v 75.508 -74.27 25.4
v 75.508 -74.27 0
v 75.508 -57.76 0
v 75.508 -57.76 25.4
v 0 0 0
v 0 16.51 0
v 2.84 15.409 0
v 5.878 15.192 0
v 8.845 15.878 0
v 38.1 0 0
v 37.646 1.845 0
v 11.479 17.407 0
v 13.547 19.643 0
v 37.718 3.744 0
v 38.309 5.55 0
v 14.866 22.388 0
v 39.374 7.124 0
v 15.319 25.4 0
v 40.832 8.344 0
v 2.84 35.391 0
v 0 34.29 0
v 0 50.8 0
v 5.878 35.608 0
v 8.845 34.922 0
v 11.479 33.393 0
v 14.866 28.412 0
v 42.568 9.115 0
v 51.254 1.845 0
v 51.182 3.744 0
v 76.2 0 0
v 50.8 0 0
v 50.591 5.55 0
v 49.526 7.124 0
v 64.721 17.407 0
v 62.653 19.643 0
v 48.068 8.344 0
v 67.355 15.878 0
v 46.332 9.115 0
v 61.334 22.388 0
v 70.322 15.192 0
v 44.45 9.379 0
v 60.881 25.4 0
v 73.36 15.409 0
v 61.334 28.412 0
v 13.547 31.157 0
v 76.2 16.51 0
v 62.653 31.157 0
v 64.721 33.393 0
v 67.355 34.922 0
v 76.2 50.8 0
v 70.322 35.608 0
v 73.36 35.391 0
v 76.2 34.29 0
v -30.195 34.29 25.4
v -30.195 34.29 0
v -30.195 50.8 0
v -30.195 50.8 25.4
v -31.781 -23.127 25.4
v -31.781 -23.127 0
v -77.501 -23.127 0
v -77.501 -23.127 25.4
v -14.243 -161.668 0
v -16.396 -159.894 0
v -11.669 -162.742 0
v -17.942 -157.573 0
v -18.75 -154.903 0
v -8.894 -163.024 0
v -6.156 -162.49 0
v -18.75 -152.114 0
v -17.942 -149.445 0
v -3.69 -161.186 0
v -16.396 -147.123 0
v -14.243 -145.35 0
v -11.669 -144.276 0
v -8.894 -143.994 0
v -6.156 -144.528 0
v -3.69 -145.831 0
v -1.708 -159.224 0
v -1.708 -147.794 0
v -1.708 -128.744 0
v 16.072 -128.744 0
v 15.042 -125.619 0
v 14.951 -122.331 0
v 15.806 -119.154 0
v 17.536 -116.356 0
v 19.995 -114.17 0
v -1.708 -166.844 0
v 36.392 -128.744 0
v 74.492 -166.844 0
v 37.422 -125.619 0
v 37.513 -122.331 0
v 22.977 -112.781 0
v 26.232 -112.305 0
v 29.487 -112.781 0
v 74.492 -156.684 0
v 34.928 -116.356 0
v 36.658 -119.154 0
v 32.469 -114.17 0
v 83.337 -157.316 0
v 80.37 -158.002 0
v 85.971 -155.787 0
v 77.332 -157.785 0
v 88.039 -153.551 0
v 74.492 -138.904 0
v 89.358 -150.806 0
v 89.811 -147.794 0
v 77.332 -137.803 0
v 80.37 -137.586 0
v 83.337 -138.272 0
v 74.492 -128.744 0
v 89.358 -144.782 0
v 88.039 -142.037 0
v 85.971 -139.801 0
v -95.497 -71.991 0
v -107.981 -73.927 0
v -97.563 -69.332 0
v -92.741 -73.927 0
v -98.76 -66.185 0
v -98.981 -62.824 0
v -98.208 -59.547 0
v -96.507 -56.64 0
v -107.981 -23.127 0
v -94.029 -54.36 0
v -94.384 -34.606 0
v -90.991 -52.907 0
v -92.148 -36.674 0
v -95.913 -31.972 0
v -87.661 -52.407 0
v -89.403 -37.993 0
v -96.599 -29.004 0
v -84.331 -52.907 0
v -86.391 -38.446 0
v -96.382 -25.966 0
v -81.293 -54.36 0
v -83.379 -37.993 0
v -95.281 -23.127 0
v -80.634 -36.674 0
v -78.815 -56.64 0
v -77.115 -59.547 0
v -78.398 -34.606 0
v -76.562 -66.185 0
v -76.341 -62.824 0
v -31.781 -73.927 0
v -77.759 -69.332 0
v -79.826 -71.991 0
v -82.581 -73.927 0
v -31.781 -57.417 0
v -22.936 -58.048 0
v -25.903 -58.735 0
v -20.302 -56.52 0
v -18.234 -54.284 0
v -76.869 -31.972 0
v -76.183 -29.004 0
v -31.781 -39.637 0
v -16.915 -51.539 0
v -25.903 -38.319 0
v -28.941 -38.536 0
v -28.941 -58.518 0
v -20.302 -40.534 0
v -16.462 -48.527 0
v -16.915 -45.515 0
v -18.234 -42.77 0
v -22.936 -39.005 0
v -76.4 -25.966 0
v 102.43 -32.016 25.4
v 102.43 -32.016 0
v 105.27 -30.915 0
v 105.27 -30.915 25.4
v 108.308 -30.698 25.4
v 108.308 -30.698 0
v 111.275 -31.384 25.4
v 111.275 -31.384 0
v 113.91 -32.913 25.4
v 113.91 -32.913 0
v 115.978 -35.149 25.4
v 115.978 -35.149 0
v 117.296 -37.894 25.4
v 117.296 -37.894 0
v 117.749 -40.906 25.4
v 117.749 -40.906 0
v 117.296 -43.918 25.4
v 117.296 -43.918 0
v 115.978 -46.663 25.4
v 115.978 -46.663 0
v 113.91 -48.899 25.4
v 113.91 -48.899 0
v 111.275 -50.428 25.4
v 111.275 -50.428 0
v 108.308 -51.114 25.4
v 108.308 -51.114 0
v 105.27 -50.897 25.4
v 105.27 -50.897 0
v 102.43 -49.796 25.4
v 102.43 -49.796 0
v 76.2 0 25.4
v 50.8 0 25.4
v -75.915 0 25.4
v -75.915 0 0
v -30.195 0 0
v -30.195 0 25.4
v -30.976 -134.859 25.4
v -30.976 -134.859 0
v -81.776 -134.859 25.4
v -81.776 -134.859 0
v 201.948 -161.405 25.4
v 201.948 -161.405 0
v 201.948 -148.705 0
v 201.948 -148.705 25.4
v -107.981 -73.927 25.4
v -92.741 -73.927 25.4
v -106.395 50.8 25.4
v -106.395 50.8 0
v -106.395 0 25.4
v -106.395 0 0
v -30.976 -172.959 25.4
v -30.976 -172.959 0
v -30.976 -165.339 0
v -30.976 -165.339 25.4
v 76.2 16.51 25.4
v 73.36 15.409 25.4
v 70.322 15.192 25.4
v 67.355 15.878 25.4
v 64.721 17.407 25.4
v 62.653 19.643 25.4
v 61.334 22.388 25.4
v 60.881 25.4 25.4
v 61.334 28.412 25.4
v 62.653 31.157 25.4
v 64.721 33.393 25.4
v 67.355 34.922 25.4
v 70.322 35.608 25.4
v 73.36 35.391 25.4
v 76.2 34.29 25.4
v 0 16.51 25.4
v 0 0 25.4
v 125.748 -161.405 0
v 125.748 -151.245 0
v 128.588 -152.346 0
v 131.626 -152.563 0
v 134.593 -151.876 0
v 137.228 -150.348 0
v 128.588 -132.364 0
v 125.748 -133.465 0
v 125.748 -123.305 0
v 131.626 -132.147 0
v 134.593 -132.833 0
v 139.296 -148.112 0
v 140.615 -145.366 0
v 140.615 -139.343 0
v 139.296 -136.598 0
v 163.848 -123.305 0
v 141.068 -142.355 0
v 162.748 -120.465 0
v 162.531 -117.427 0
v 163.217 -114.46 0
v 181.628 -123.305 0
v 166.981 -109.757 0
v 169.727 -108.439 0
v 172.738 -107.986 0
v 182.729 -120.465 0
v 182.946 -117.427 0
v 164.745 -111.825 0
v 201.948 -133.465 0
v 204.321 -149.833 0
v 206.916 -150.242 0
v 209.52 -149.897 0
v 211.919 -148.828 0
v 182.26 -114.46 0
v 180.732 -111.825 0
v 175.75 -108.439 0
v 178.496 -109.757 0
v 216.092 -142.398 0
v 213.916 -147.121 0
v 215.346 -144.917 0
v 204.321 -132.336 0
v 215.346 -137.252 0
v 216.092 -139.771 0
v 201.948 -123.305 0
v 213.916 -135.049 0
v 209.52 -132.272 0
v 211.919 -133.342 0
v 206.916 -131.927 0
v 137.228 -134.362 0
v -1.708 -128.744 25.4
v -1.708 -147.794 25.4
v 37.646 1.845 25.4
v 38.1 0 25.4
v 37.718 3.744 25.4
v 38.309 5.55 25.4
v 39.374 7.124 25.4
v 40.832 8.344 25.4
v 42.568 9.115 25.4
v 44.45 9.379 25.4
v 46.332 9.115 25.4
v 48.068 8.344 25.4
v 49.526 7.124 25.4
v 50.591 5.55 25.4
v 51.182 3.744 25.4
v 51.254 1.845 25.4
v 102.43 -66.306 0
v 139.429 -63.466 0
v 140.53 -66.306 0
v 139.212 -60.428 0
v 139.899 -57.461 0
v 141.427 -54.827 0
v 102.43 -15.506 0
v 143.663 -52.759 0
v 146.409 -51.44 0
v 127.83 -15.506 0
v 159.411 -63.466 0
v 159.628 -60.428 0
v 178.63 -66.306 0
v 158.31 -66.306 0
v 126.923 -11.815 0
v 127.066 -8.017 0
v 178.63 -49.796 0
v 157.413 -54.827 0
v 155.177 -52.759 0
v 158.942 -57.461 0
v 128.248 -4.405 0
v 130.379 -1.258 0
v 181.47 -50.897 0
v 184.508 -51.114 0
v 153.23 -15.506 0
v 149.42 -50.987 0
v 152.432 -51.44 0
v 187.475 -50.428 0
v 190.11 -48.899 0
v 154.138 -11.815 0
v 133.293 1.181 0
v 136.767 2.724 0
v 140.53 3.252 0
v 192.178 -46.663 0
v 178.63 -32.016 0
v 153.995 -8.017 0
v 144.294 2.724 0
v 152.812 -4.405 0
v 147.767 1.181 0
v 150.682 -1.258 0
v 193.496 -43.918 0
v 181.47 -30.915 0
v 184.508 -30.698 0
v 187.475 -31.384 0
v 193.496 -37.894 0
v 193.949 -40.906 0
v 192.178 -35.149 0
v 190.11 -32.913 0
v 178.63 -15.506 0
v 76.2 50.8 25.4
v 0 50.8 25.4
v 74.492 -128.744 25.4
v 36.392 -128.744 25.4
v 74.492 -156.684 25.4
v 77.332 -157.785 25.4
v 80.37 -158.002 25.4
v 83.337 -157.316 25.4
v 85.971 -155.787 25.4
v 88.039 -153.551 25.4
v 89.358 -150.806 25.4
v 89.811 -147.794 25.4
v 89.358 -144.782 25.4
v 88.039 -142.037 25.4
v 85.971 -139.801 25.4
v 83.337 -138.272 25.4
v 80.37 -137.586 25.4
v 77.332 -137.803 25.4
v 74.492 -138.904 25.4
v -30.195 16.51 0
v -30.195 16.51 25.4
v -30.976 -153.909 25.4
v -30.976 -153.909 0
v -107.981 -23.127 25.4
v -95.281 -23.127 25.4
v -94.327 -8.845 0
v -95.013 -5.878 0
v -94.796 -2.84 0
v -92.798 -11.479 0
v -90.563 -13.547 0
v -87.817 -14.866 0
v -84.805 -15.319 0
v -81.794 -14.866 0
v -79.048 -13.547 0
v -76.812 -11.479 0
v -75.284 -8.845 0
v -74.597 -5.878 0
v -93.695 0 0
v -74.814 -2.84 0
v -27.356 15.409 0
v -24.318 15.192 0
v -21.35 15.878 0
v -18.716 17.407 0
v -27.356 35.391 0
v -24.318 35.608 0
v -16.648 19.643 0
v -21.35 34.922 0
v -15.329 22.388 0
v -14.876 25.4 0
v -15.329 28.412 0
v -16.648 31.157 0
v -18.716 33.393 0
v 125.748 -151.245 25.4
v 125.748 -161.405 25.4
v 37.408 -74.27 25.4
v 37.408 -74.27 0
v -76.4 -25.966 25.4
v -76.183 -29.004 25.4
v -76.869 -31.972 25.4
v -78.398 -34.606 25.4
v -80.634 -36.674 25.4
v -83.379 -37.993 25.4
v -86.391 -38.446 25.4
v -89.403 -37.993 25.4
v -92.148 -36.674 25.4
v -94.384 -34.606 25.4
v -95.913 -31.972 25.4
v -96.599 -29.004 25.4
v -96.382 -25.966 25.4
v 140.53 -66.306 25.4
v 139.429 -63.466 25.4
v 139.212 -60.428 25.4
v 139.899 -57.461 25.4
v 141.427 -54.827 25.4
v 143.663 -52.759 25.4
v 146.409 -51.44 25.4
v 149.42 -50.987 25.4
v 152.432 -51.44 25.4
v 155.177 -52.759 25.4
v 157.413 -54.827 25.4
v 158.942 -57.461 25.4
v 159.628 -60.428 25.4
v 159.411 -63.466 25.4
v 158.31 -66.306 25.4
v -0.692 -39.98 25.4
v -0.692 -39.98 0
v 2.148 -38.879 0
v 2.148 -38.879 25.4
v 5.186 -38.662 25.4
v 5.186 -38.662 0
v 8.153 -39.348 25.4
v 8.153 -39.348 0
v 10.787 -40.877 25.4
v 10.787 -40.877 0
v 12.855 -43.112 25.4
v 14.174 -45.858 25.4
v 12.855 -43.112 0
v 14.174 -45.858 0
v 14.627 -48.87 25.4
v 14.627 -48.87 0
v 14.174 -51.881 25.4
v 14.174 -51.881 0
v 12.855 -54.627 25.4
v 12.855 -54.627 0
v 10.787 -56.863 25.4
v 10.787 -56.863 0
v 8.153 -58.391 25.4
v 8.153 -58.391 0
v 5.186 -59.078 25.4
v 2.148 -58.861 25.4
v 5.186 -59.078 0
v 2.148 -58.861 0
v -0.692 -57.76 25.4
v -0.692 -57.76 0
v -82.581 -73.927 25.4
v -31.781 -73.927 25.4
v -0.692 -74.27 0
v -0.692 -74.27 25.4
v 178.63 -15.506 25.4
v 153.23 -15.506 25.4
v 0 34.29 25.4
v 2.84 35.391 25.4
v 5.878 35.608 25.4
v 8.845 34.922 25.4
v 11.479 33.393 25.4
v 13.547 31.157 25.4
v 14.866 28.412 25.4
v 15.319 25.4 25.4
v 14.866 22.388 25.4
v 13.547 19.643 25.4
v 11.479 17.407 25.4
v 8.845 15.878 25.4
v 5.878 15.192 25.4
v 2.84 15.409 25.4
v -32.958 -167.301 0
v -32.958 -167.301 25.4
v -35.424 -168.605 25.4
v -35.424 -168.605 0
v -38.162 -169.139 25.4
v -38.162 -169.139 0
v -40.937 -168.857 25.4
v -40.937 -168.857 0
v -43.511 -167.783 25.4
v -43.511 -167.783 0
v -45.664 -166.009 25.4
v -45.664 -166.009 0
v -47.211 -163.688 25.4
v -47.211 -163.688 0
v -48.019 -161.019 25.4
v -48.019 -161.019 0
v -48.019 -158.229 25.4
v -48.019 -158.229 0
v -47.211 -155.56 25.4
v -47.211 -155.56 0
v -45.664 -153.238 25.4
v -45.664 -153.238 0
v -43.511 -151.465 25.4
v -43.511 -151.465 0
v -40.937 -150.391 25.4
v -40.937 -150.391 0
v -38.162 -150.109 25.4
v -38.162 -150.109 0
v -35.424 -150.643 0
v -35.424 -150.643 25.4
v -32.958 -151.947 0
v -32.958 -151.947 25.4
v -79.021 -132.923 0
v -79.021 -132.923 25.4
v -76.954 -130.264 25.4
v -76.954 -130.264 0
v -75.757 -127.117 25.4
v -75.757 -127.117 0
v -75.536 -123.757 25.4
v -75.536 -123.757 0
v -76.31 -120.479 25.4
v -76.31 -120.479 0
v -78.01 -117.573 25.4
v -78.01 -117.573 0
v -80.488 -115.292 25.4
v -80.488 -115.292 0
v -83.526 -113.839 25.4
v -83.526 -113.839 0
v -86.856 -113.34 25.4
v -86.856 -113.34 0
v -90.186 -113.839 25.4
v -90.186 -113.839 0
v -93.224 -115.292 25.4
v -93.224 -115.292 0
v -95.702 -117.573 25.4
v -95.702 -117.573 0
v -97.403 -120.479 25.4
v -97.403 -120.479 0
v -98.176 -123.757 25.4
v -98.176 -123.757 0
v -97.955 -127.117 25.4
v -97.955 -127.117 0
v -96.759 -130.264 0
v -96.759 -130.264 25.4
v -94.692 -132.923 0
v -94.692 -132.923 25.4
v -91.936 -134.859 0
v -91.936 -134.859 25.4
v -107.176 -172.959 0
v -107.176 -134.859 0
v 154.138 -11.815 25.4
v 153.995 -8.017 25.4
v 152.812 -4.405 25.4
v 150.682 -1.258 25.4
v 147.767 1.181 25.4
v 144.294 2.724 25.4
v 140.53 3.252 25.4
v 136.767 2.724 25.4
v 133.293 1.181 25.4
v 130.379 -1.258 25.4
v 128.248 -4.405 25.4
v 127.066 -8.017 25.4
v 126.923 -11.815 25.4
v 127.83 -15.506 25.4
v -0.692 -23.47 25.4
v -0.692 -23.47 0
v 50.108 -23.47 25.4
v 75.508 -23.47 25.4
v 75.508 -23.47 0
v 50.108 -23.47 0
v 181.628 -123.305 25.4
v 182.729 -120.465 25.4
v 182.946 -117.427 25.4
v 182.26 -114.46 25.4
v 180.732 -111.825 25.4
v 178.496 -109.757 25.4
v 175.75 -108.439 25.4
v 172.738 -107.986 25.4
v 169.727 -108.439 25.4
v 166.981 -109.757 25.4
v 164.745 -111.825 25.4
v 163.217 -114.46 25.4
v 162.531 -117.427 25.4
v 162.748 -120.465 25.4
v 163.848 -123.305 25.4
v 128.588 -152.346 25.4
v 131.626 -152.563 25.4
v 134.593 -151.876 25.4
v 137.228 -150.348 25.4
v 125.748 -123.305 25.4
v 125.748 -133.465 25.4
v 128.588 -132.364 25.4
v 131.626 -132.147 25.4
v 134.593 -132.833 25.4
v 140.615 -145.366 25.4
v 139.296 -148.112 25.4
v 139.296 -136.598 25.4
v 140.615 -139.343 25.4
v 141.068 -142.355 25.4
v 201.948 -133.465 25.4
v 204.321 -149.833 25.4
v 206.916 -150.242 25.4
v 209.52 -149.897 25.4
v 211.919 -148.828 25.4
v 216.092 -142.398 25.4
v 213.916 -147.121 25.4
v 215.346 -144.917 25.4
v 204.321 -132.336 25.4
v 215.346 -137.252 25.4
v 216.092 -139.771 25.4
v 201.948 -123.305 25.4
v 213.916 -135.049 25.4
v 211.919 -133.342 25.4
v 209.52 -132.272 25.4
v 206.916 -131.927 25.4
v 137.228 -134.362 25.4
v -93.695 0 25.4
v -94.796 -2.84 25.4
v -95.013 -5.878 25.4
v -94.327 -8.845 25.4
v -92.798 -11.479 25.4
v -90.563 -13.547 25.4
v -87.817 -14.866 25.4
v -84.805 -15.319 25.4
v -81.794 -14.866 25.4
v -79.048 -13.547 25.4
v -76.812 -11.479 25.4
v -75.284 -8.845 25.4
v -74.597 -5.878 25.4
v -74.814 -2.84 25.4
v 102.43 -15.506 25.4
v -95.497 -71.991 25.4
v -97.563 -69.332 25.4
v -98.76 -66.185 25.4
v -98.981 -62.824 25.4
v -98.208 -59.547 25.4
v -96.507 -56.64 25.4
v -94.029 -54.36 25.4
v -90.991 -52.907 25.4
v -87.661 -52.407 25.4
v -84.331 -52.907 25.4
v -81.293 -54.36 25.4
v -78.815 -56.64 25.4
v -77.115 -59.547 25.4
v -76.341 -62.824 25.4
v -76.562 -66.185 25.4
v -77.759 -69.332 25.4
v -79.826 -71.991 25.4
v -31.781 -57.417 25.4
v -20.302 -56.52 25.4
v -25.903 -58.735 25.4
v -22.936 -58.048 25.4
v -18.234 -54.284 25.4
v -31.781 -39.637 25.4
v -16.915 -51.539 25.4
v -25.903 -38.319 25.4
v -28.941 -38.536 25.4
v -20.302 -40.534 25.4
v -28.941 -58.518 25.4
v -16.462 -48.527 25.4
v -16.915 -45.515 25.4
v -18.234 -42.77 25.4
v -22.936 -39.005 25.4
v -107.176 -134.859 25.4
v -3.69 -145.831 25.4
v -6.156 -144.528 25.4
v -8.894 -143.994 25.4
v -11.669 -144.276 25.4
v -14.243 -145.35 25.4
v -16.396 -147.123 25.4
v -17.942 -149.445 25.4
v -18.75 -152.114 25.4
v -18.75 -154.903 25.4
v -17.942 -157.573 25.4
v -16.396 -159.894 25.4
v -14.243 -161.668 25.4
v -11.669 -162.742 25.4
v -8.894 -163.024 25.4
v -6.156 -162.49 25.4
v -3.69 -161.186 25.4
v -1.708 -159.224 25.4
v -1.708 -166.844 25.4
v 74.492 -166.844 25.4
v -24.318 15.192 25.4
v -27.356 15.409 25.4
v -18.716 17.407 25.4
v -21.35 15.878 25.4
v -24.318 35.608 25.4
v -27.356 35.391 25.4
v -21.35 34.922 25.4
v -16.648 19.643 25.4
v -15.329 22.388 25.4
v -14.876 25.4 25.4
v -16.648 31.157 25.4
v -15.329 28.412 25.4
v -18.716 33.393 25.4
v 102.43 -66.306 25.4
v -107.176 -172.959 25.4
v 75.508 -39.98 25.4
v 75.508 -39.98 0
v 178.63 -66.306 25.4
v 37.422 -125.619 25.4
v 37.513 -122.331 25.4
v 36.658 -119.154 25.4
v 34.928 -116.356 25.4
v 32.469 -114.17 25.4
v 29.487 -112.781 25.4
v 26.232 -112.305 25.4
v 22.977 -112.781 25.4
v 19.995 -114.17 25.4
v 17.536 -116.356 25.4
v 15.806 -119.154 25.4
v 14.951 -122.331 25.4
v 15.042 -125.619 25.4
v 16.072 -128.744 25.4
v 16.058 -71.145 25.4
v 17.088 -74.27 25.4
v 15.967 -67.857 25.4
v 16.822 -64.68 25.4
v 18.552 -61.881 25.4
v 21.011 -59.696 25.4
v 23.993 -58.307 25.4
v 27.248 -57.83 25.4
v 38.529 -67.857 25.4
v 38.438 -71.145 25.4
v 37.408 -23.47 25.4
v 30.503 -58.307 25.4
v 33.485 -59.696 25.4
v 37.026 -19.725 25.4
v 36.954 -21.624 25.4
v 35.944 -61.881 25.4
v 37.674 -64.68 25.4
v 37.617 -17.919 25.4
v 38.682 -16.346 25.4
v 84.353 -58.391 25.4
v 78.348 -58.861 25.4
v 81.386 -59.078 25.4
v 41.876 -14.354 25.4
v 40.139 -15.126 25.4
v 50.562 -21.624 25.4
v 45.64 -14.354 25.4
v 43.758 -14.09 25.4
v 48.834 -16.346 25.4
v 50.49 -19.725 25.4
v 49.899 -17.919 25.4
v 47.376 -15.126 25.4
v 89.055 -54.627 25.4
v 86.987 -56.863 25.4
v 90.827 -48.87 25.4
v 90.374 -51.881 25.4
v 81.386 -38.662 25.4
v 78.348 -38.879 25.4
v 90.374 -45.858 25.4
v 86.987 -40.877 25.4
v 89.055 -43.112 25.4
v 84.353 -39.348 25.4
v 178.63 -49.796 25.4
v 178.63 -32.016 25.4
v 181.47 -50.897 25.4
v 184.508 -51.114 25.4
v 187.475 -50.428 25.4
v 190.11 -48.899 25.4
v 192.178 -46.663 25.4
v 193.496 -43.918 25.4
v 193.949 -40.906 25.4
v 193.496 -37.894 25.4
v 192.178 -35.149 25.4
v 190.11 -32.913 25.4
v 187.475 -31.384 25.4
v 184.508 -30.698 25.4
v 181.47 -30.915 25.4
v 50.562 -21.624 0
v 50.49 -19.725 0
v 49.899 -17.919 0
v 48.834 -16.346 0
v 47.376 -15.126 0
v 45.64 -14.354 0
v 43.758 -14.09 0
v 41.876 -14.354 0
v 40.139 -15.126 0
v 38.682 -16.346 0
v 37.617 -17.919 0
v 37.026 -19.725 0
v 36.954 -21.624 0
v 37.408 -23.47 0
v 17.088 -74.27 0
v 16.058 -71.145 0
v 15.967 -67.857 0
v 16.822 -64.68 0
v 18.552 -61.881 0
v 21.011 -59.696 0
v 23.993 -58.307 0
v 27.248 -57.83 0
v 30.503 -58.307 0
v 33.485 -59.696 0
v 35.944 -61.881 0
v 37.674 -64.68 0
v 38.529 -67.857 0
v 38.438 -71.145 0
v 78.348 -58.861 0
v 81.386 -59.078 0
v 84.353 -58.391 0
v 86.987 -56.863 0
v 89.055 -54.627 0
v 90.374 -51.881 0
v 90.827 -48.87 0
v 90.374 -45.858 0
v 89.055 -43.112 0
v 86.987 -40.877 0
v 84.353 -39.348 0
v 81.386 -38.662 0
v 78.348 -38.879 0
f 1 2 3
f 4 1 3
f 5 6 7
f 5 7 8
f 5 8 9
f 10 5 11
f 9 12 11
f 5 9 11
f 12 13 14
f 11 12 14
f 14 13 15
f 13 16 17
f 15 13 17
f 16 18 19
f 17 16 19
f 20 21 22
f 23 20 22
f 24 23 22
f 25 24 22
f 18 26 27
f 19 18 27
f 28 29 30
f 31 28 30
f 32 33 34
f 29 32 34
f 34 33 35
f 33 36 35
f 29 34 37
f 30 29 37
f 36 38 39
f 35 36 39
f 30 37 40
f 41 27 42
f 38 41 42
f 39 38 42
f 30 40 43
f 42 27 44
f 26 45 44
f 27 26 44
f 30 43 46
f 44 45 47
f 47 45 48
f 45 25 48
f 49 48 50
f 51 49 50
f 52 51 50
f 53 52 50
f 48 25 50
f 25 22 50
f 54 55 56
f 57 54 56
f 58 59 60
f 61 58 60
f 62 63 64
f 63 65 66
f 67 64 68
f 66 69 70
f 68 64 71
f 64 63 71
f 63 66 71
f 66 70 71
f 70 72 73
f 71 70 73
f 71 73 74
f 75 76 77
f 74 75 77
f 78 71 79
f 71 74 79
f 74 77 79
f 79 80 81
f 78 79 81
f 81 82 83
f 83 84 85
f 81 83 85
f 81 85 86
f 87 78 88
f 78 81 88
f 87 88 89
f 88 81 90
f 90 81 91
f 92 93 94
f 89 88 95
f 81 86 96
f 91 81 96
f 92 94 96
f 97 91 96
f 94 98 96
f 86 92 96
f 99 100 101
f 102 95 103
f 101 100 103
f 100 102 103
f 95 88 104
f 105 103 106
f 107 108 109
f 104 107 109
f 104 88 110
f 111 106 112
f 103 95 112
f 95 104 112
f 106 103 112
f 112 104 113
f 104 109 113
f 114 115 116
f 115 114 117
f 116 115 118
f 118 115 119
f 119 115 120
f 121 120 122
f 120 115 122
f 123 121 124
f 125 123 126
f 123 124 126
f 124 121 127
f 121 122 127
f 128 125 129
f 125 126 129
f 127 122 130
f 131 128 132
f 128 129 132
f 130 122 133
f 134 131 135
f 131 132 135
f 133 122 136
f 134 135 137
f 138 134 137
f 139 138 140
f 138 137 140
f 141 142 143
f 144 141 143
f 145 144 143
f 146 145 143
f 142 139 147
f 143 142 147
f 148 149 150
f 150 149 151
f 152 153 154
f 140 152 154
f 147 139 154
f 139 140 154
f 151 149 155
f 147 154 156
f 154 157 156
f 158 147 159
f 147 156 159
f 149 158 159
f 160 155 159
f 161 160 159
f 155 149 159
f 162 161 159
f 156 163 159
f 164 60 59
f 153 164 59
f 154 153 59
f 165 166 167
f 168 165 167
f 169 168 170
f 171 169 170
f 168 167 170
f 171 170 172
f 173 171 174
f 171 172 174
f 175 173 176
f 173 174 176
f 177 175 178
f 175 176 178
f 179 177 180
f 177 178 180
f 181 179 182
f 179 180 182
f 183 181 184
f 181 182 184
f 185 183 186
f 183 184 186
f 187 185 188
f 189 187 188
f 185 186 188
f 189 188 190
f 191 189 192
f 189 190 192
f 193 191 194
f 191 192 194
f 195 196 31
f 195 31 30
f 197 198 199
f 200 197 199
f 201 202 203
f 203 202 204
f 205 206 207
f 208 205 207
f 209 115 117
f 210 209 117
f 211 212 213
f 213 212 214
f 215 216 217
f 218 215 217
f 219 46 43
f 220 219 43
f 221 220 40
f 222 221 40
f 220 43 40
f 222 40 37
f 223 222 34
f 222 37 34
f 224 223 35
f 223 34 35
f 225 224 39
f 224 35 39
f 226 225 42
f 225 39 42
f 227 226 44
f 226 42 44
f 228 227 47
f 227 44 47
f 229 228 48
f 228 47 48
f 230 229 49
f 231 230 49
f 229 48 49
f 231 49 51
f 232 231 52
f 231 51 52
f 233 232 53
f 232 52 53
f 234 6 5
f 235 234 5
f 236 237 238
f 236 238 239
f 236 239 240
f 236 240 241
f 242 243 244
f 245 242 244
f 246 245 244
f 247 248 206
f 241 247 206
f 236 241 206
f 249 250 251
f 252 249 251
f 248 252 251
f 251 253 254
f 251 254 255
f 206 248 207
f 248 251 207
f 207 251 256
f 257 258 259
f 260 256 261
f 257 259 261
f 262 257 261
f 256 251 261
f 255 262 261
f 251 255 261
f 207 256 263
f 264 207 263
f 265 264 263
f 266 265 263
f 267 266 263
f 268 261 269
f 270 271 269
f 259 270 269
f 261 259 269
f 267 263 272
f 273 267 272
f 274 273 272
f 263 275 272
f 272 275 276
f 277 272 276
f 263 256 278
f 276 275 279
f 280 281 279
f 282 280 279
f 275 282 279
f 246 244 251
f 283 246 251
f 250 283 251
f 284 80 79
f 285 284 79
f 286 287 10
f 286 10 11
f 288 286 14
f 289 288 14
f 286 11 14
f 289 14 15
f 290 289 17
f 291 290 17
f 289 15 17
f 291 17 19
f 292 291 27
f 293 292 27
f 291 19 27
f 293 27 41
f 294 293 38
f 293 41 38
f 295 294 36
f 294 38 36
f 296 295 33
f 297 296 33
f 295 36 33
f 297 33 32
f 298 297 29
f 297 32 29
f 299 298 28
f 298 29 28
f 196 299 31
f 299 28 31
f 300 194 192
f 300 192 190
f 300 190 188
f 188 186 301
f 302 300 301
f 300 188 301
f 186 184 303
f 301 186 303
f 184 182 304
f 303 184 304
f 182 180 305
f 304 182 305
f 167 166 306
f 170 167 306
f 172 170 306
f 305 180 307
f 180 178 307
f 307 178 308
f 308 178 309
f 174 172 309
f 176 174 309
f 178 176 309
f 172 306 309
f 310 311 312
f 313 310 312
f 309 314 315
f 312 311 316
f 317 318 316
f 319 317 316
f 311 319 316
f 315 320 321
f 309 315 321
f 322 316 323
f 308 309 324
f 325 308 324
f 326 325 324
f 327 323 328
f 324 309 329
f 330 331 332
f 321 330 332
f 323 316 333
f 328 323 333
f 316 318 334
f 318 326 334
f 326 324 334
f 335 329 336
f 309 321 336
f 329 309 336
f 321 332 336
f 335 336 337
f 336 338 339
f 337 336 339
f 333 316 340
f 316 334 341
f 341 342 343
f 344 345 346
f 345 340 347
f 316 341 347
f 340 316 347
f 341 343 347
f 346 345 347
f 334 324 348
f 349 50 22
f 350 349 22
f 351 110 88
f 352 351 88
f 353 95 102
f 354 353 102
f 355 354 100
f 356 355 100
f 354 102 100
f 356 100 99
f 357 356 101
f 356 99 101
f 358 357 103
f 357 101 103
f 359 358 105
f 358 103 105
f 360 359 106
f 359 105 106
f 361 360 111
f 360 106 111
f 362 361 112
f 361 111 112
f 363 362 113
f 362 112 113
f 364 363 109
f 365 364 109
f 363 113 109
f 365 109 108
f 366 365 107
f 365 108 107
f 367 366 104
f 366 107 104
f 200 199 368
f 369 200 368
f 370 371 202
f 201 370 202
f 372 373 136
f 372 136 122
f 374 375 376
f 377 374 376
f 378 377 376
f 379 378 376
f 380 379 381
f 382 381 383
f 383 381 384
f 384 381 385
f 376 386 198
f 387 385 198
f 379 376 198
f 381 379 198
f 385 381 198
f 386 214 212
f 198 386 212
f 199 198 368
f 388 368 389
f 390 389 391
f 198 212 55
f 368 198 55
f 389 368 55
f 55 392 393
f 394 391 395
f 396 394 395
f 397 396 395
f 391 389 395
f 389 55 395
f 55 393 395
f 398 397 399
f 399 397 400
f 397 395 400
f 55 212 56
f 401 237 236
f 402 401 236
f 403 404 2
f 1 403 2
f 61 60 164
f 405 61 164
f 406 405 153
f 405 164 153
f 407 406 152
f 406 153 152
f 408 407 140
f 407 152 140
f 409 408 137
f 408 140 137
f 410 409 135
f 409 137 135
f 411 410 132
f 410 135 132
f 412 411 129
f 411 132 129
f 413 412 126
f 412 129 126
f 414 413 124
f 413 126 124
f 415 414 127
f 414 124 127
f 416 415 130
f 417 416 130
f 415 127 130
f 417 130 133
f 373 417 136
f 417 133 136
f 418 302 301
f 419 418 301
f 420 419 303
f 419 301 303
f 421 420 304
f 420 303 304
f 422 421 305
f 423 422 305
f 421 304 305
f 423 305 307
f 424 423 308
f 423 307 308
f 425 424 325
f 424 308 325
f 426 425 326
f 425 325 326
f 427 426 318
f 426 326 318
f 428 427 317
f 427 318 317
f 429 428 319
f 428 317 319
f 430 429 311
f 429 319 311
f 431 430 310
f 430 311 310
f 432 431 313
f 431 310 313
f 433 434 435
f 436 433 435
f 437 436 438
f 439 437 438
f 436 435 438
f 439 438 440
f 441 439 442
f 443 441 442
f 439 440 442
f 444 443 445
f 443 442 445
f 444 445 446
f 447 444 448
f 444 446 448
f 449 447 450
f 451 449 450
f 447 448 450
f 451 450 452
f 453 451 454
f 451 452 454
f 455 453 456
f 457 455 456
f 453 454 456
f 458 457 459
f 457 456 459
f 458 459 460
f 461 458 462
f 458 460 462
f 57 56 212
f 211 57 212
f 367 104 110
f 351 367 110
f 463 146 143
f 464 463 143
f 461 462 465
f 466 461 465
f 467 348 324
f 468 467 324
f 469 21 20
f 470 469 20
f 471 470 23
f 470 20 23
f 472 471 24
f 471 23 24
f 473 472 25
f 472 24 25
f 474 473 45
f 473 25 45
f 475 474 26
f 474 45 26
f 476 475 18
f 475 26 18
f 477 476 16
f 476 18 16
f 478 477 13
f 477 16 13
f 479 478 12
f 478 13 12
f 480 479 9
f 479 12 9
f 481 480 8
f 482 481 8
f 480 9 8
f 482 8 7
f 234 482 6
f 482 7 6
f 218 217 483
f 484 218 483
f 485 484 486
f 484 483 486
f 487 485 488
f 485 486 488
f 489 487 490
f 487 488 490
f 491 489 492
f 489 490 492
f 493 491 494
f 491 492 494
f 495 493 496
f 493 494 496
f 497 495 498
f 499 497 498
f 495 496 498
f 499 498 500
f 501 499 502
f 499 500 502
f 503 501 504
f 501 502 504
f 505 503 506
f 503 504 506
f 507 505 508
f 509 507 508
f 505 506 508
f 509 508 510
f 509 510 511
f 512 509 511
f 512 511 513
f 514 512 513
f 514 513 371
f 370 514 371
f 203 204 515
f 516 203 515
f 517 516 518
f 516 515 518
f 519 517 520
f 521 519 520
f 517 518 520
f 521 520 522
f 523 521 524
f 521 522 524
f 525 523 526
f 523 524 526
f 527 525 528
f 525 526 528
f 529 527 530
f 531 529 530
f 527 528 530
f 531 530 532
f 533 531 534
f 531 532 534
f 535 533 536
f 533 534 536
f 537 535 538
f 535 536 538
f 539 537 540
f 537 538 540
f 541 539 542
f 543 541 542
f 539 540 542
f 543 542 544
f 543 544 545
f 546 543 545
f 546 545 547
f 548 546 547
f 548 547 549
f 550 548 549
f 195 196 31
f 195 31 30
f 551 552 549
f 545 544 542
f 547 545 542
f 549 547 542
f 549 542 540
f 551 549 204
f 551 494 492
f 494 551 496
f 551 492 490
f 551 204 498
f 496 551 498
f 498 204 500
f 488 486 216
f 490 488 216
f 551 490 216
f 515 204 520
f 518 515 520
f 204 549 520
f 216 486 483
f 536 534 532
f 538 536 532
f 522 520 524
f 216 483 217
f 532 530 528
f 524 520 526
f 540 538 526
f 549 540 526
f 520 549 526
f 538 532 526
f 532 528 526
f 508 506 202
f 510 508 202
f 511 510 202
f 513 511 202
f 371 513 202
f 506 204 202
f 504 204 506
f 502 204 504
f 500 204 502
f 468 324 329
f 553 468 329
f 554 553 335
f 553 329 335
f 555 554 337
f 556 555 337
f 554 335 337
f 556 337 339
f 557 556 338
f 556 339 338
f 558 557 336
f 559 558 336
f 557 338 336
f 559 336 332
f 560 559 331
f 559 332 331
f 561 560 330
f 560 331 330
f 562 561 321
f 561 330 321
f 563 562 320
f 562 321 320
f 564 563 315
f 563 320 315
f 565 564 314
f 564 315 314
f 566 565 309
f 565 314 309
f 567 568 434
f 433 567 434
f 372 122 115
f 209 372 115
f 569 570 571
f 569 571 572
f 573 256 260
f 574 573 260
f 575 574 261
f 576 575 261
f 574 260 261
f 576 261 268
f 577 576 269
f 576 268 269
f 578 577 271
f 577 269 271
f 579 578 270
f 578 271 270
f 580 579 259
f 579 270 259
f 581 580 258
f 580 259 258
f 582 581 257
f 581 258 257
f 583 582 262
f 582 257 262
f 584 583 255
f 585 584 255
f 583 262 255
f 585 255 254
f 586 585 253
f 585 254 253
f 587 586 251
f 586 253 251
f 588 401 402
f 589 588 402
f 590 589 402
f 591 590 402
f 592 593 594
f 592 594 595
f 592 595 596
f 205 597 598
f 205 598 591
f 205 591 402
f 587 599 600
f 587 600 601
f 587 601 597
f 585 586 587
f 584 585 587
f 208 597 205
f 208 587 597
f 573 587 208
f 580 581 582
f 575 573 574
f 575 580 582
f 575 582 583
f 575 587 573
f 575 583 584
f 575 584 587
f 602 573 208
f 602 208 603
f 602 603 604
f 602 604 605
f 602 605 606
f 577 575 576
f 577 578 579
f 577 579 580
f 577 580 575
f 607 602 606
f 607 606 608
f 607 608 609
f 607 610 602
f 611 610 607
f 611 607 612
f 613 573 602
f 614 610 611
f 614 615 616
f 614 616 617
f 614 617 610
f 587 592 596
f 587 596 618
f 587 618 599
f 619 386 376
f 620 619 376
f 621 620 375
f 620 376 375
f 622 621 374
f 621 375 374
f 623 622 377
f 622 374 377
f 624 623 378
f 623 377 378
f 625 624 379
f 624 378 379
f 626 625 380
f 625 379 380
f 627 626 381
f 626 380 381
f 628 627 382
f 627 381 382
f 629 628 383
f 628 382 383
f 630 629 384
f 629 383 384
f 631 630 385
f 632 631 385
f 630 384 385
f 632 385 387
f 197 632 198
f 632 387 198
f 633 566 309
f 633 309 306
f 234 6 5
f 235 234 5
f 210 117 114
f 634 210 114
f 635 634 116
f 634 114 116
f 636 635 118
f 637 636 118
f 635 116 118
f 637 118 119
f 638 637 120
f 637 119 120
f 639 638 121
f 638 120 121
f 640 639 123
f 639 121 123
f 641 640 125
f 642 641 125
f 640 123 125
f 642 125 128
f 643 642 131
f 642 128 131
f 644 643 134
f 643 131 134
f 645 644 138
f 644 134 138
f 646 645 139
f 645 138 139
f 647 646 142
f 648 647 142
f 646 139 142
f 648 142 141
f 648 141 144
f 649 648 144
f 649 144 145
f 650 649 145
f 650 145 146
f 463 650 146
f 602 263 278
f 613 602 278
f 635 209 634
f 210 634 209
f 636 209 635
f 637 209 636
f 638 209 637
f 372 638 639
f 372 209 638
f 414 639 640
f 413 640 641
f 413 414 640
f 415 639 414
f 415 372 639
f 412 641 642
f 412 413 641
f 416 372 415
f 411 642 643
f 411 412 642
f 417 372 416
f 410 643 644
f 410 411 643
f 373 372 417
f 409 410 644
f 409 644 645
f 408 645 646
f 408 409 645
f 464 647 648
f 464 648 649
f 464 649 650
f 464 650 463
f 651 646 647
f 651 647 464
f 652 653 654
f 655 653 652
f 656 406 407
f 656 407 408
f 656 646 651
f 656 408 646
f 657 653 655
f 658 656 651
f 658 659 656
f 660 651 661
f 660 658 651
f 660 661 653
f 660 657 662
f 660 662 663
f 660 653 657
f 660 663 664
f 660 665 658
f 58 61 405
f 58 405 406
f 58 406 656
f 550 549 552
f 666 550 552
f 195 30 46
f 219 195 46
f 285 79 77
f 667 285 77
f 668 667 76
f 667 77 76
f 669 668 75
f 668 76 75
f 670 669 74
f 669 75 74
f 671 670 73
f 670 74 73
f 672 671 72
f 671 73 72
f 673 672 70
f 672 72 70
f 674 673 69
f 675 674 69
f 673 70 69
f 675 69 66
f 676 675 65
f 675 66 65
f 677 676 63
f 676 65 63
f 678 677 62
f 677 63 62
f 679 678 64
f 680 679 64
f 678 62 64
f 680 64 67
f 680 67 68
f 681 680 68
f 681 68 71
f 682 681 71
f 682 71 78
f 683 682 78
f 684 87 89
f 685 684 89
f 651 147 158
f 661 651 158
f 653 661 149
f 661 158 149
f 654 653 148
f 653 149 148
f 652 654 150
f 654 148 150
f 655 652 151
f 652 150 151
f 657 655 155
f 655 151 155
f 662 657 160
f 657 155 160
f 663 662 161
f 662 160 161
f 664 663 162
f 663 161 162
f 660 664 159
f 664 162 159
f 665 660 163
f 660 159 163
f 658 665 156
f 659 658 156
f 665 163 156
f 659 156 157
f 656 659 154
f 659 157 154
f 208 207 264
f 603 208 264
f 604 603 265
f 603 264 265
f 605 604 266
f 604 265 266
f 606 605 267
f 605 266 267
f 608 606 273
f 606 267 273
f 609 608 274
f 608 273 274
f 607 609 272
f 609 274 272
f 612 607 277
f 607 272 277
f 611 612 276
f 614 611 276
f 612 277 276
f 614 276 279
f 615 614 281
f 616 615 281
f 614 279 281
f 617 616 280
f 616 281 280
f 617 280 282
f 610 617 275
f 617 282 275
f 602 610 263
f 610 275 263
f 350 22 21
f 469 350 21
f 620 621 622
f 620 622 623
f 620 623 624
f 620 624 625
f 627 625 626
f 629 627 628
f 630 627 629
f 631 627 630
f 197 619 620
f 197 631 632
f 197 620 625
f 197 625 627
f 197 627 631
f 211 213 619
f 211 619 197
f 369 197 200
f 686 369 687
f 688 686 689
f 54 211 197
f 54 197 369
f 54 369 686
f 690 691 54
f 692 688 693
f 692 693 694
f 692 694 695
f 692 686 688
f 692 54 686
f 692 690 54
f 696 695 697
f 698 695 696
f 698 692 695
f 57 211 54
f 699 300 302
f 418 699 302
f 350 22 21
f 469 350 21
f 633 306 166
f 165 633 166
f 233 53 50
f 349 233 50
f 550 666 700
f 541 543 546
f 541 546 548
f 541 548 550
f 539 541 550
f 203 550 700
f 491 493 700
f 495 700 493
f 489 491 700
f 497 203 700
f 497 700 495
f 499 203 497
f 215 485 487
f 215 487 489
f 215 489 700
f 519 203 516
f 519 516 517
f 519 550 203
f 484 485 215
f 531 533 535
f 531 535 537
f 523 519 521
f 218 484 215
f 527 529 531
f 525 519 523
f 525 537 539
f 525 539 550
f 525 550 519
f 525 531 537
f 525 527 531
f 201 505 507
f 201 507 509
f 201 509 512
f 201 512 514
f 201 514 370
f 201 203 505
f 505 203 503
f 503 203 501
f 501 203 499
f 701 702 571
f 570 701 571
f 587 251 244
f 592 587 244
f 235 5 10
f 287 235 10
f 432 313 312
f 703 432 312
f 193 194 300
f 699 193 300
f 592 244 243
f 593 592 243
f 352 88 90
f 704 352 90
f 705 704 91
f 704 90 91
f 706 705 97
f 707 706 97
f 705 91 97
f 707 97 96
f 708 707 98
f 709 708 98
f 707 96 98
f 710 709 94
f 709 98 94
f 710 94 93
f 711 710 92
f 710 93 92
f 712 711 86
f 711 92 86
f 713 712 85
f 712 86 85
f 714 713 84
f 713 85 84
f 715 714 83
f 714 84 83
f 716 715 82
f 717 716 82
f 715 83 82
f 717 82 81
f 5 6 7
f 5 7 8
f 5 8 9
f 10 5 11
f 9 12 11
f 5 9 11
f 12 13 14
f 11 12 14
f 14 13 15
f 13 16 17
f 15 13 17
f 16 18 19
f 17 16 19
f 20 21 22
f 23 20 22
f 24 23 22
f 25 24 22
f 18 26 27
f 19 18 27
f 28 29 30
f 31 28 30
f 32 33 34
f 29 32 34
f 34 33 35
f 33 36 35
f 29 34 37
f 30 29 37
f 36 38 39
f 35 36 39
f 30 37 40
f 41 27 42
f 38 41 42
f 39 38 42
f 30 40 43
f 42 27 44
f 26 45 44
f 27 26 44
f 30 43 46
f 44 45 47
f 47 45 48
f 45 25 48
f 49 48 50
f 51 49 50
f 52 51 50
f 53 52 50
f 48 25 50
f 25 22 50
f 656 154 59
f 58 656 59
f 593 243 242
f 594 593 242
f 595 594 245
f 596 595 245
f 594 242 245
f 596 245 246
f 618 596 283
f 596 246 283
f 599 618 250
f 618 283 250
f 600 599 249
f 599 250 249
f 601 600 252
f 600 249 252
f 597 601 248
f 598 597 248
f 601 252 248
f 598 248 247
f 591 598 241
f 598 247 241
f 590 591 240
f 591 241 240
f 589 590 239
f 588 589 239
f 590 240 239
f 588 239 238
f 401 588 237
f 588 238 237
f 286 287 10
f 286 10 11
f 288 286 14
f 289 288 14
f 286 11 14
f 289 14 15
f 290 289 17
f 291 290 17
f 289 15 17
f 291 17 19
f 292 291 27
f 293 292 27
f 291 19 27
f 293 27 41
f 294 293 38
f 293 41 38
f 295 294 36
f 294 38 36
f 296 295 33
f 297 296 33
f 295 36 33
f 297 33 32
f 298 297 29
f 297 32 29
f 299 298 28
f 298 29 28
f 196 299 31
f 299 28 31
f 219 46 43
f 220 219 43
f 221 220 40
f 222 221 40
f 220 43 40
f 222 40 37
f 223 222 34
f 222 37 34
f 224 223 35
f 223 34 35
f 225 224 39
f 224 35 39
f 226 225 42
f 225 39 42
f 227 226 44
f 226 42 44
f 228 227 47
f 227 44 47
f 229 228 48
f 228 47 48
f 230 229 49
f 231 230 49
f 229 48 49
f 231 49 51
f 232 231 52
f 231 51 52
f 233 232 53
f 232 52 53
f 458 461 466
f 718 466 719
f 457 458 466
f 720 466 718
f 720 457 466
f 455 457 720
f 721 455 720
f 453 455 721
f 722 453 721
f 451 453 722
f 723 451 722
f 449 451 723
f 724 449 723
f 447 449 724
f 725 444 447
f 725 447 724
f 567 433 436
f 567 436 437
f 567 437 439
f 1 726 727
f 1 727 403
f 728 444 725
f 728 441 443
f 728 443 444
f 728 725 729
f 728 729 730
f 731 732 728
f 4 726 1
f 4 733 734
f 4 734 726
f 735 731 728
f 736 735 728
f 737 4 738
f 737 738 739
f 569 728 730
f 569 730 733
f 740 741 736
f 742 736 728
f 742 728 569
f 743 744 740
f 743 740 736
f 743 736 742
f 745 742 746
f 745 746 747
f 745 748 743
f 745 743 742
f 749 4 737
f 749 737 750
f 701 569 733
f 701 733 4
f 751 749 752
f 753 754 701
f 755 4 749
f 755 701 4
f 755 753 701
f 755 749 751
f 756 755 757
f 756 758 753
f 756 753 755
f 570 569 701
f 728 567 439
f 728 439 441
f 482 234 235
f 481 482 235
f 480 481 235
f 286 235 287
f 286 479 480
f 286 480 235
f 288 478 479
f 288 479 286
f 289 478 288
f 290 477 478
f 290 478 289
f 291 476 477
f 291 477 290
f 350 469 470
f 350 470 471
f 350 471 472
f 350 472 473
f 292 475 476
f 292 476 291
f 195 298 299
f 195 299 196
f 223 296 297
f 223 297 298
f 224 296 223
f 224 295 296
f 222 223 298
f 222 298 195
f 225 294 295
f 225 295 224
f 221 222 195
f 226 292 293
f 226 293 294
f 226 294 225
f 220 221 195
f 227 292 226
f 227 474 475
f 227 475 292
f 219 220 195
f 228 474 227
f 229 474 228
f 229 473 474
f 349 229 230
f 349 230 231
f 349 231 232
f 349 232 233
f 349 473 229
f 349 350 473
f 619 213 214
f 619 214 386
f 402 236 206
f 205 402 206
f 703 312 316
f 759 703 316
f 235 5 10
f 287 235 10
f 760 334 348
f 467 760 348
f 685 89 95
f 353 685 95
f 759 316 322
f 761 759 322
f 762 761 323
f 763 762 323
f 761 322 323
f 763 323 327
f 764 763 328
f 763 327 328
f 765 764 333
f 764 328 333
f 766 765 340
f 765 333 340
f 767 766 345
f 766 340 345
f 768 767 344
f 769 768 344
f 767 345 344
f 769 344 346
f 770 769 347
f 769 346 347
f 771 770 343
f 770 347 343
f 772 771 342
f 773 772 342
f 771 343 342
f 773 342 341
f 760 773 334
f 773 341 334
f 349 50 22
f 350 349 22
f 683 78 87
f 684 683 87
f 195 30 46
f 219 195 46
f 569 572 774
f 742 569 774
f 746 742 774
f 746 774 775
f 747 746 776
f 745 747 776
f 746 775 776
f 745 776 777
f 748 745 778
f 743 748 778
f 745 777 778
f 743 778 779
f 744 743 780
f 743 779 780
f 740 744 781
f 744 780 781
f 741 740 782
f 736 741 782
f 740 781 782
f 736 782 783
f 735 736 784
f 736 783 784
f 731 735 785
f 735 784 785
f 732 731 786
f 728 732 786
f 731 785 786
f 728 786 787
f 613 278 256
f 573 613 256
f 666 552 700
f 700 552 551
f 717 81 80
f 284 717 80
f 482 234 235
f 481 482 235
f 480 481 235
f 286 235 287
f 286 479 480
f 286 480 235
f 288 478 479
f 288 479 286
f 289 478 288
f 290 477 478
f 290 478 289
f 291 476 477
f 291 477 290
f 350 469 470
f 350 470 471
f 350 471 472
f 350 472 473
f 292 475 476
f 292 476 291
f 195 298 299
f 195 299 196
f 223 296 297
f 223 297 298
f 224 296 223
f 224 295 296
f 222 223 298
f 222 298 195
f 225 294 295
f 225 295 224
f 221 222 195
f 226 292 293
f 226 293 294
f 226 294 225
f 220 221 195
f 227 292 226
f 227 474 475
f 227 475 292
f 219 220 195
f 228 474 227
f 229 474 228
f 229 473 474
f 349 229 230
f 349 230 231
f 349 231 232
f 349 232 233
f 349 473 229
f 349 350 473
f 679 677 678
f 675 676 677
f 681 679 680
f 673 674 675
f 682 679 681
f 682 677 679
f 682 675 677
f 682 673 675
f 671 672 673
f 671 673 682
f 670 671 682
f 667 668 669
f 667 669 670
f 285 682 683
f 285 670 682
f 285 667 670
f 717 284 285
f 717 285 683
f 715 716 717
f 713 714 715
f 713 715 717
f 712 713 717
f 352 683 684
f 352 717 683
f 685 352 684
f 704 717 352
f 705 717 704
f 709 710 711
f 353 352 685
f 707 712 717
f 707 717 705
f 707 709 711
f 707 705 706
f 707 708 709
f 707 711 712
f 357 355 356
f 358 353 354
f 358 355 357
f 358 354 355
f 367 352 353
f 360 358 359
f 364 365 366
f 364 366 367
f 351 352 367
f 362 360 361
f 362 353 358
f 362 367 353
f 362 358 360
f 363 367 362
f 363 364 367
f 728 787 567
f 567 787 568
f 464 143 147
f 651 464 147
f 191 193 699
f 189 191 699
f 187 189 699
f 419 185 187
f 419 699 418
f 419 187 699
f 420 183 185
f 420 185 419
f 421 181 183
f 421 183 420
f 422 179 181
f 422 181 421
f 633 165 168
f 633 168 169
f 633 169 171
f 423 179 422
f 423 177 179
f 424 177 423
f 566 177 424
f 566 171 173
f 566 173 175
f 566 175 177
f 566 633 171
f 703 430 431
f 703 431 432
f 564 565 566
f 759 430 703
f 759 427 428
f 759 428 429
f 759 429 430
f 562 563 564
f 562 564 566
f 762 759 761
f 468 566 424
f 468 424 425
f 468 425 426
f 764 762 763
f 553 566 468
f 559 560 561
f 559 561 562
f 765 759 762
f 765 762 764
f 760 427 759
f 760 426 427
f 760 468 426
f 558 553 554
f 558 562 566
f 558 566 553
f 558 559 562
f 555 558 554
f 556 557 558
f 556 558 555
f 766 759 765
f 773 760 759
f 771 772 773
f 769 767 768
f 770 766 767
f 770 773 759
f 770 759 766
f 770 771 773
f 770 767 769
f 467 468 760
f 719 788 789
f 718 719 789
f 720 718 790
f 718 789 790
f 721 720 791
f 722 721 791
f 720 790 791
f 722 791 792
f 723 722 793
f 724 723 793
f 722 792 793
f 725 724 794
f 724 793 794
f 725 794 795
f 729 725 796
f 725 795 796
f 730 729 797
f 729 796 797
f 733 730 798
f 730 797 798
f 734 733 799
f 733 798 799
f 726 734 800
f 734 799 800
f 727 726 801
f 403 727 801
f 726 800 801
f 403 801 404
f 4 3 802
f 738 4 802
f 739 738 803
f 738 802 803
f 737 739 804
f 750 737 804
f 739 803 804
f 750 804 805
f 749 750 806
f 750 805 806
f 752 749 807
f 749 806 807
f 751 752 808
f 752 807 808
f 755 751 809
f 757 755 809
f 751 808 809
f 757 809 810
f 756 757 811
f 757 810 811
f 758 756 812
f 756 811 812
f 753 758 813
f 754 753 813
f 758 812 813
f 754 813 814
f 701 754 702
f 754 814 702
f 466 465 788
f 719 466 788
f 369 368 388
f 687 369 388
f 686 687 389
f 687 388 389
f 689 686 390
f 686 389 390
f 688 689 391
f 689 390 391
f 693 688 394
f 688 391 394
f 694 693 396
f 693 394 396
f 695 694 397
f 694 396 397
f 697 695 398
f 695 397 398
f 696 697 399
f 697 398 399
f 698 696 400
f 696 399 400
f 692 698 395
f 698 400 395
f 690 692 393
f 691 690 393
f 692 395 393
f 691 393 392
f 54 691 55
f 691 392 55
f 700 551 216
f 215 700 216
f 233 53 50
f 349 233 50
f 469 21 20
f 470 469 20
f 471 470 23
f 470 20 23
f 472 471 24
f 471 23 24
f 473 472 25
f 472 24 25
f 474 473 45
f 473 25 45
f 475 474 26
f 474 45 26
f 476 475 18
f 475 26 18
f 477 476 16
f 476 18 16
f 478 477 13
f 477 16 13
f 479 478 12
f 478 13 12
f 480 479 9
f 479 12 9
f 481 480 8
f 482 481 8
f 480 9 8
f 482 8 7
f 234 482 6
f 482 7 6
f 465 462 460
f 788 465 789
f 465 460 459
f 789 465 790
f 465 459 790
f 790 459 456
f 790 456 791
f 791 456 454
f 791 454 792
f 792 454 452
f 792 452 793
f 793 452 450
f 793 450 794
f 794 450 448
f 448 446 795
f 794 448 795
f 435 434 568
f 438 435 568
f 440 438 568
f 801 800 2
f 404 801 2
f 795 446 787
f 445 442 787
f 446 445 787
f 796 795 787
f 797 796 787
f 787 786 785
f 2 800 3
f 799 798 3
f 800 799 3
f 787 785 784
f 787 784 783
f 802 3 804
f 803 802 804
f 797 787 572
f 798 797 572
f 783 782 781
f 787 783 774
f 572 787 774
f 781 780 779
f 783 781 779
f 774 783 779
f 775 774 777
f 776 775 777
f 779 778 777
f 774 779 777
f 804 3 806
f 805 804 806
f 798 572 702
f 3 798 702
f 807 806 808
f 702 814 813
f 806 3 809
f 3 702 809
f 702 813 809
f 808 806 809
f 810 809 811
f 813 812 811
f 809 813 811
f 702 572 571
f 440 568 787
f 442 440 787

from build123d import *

# Parameters (mm, degrees)
F1_DEPTH  = 25.4
F3_DEPTH  = 25.4
F5_DEPTH  = 25.4
F7_DEPTH  = 25.4
F8_DEPTH  = 25.4
F10_DEPTH = 25.4
F12_DEPTH = 25.4
F14_DEPTH = 25.4
F16_DEPTH = 25.4


# Not quite as in the source:
# - a feature names something its author has since deleted; it is built from what else it names


with BuildPart() as f1:
    # F0 (on Top) → F1 (new body)
    with BuildSketch(Plane.XY):
        with BuildLine():
            Line((0, 16.51), (0, 0))
            Line((0, 0), (38.1, 0))
            ThreePointArc((38.1, 0), (44.45, 9.3791593051), (50.8, 0))
            Line((50.8, 0), (76.2, 0))
            Line((76.2, 0), (76.2, 16.51))
            ThreePointArc((76.2, 16.51), (60.8809326597, 25.4), (76.2, 34.29))
            Line((76.2, 34.29), (76.2, 50.8))
            Line((76.2, 50.8), (0, 50.8))
            Line((0, 50.8), (0, 34.29))
            ThreePointArc((0, 34.29), (15.3190673403, 25.4), (0, 16.51))
        make_face()
    extrude(amount=F1_DEPTH)


with BuildPart() as f3:
    # F2 (on Top) → F3 (new body)
    with BuildSketch(Plane.XY):
        Polygon((-30.1954353519, 34.29), (-30.1954353519, 50.8), (-106.3954353519, 50.8), (-106.3954353519, 0), (-93.6954353519, 0), (-75.9154353519, 0), (-30.1954353519, 0), (-30.1954353519, 16.51), align=None)
        with BuildLine():
            ThreePointArc((-30.1954353519, 16.51), (-14.8763680116, 25.4), (-30.1954353519, 34.29))
            Line((-30.1954353519, 34.29), (-30.1954353519, 16.51))
        make_face()
        with BuildLine():
            Line((-75.9154353519, 0), (-93.6954353519, 0))
            ThreePointArc((-93.6954353519, 0), (-84.8054353519, -15.3190673403), (-75.9154353519, 0))
        make_face()
    extrude(amount=F3_DEPTH)


with BuildPart() as f5:
    # F4 (on Top) → F5 (new body)
    with BuildSketch(Plane.XY):
        with BuildLine():
            Line((-31.7811166644, -39.6367072773), (-31.7811166644, -23.1267072773))
            Line((-31.7811166644, -23.1267072773), (-77.5011166644, -23.1267072773))
            ThreePointArc((-77.5011166644, -23.1267072773), (-86.3911166644, -38.4457746176), (-95.2811166644, -23.1267072773))
            Line((-95.2811166644, -23.1267072773), (-107.9811166644, -23.1267072773))
            Line((-107.9811166644, -23.1267072773), (-107.9811166644, -73.9267072773))
            Line((-107.9811166644, -73.9267072773), (-92.7411166644, -73.9267072773))
            ThreePointArc((-92.7411166644, -73.9267072773), (-87.6611166644, -52.4074819516), (-82.5811166644, -73.9267072773))
            Line((-82.5811166644, -73.9267072773), (-31.7811166644, -73.9267072773))
            Line((-31.7811166644, -73.9267072773), (-31.7811166644, -57.4167072773))
            Line((-31.7811166644, -57.4167072773), (-31.7811166644, -39.6367072773))
        make_face()
        with BuildLine():
            ThreePointArc((-31.7811166644, -57.4167072773), (-16.4620493241, -48.5267072773), (-31.7811166644, -39.6367072773))
            Line((-31.7811166644, -39.6367072773), (-31.7811166644, -57.4167072773))
        make_face()
    extrude(amount=F5_DEPTH)


with BuildPart() as f7:
    # F6 (on Top) → F7 (new body)
    with BuildSketch(Plane.XY):
        with BuildLine():
            ThreePointArc((50.1078782513, -23.4696016228), (43.7578782513, -14.0904423178), (37.4078782513, -23.4696016228))
            Line((37.4078782513, -23.4696016228), (50.1078782513, -23.4696016228))
        make_face()
        with BuildLine():
            ThreePointArc((75.5078782513, -57.7596016228), (90.8269455917, -48.8696016228), (75.5078782513, -39.9796016228))
            Line((75.5078782513, -39.9796016228), (75.5078782513, -57.7596016228))
        make_face()
        with BuildLine():
            Line((37.4078782513, -23.4696016228), (-0.6921217487, -23.4696016228))
            Line((-0.6921217487, -23.4696016228), (-0.6921217487, -39.9796016228))
            ThreePointArc((-0.6921217487, -39.9796016228), (14.6269455917, -48.8696016228), (-0.6921217487, -57.7596016228))
            Line((-0.6921217487, -57.7596016228), (-0.6921217487, -74.2696016228))
            Line((-0.6921217487, -74.2696016228), (17.0878782513, -74.2696016228))
            ThreePointArc((17.0878782513, -74.2696016228), (27.2478782513, -57.8303762971), (37.4078782513, -74.2696016228))
            Line((37.4078782513, -74.2696016228), (75.5078782513, -74.2696016228))
            Line((75.5078782513, -74.2696016228), (75.5078782513, -57.7596016228))
            Line((75.5078782513, -57.7596016228), (75.5078782513, -39.9796016228))
            Line((75.5078782513, -39.9796016228), (75.5078782513, -23.4696016228))
            Line((75.5078782513, -23.4696016228), (50.1078782513, -23.4696016228))
            Line((50.1078782513, -23.4696016228), (37.4078782513, -23.4696016228))
        make_face()
    extrude(amount=F7_DEPTH)


with BuildPart() as f8:
    # F0 (on Top) → F8 (new body)
    with BuildSketch(Plane.XY):
        with BuildLine():
            Line((0, 16.51), (0, 0))
            Line((0, 0), (38.1, 0))
            ThreePointArc((38.1, 0), (44.45, 9.3791593051), (50.8, 0))
            Line((50.8, 0), (76.2, 0))
            Line((76.2, 0), (76.2, 16.51))
            ThreePointArc((76.2, 16.51), (60.8809326597, 25.4), (76.2, 34.29))
            Line((76.2, 34.29), (76.2, 50.8))
            Line((76.2, 50.8), (0, 50.8))
            Line((0, 50.8), (0, 34.29))
            ThreePointArc((0, 34.29), (15.3190673403, 25.4), (0, 16.51))
        make_face()
    extrude(amount=F8_DEPTH)


with BuildPart() as f10:
    # F9 (on Top) → F10 (new body)
    with BuildSketch(Plane.XY):
        with BuildLine():
            ThreePointArc((153.2303552747, -15.5059827256), (140.5303552747, 3.2523358845), (127.8303552747, -15.5059827256))
            Line((127.8303552747, -15.5059827256), (153.2303552747, -15.5059827256))
        make_face()
        with BuildLine():
            ThreePointArc((178.6303552747, -49.7959827256), (193.949422615, -40.9059827256), (178.6303552747, -32.0159827256))
            Line((178.6303552747, -32.0159827256), (178.6303552747, -49.7959827256))
        make_face()
        with BuildLine():
            Line((127.8303552747, -15.5059827256), (102.4303552747, -15.5059827256))
            Line((102.4303552747, -15.5059827256), (102.4303552747, -32.0159827256))
            ThreePointArc((102.4303552747, -32.0159827256), (117.749422615, -40.9059827256), (102.4303552747, -49.7959827256))
            Line((102.4303552747, -49.7959827256), (102.4303552747, -66.3059827256))
            Line((102.4303552747, -66.3059827256), (140.5303552747, -66.3059827256))
            ThreePointArc((140.5303552747, -66.3059827256), (149.4203552747, -50.9869153853), (158.3103552747, -66.3059827256))
            Line((158.3103552747, -66.3059827256), (178.6303552747, -66.3059827256))
            Line((178.6303552747, -66.3059827256), (178.6303552747, -49.7959827256))
            Line((178.6303552747, -49.7959827256), (178.6303552747, -32.0159827256))
            Line((178.6303552747, -32.0159827256), (178.6303552747, -15.5059827256))
            Line((178.6303552747, -15.5059827256), (153.2303552747, -15.5059827256))
            Line((153.2303552747, -15.5059827256), (127.8303552747, -15.5059827256))
        make_face()
    extrude(amount=F10_DEPTH)


with BuildPart() as f12:
    # F11 (on Top) → F12 (new body)
    with BuildSketch(Plane.XY):
        with BuildLine():
            ThreePointArc((-81.7762166262, -134.8588719903), (-86.8562166262, -113.3396466646), (-91.9362166262, -134.8588719903))
            Line((-91.9362166262, -134.8588719903), (-81.7762166262, -134.8588719903))
        make_face()
        with BuildLine():
            Line((-91.9362166262, -134.8588719903), (-107.1762166262, -134.8588719903))
            Line((-107.1762166262, -134.8588719903), (-107.1762166262, -172.9588719903))
            Line((-107.1762166262, -172.9588719903), (-30.9762166262, -172.9588719903))
            Line((-30.9762166262, -172.9588719903), (-30.9762166262, -165.3388719903))
            ThreePointArc((-30.9762166262, -165.3388719903), (-48.1212166262, -159.6238719903), (-30.9762166262, -153.9088719903))
            Line((-30.9762166262, -153.9088719903), (-30.9762166262, -134.8588719903))
            Line((-30.9762166262, -134.8588719903), (-81.7762166262, -134.8588719903))
            Line((-81.7762166262, -134.8588719903), (-91.9362166262, -134.8588719903))
        make_face()
    extrude(amount=F12_DEPTH)


with BuildPart() as f14:
    # F13 (on Top) → F14 (new body)
    with BuildSketch(Plane.XY):
        Polygon((16.0720860608, -128.7438145399), (-1.7079139392, -128.7438145399), (-1.7079139392, -147.7938145399), (-1.7079139392, -159.2238145399), (-1.7079139392, -166.8438145399), (74.4920860608, -166.8438145399), (74.4920860608, -156.6838145399), (74.4920860608, -138.9038145399), (74.4920860608, -128.7438145399), (36.3920860608, -128.7438145399), align=None)
        with BuildLine():
            ThreePointArc((36.3920860608, -128.7438145399), (26.2320860608, -112.3045892142), (16.0720860608, -128.7438145399))
            Line((16.0720860608, -128.7438145399), (36.3920860608, -128.7438145399))
        make_face()
        with BuildLine():
            Line((-1.7079139392, -159.2238145399), (-1.7079139392, -147.7938145399))
            ThreePointArc((-1.7079139392, -147.7938145399), (-18.8529139392, -153.5088145399), (-1.7079139392, -159.2238145399))
        make_face()
        with BuildLine():
            ThreePointArc((74.4920860608, -156.6838145399), (89.8111534011, -147.7938145399), (74.4920860608, -138.9038145399))
            Line((74.4920860608, -138.9038145399), (74.4920860608, -156.6838145399))
        make_face()
    extrude(amount=F14_DEPTH)


with BuildPart() as f16:
    # F15 (on Top) → F16 (new body)
    with BuildSketch(Plane.XY):
        with BuildLine():
            ThreePointArc((181.6284889733, -123.3046403503), (172.7384889733, -107.98557301), (163.8484889733, -123.3046403503))
            Line((163.8484889733, -123.3046403503), (181.6284889733, -123.3046403503))
        make_face()
        with BuildLine():
            Line((163.8484889733, -123.3046403503), (125.7484889733, -123.3046403503))
            Line((125.7484889733, -123.3046403503), (125.7484889733, -133.4646403503))
            ThreePointArc((125.7484889733, -133.4646403503), (141.0675563136, -142.3546403503), (125.7484889733, -151.2446403503))
            Line((125.7484889733, -151.2446403503), (125.7484889733, -161.4046403503))
            Line((125.7484889733, -161.4046403503), (201.9484889733, -161.4046403503))
            Line((201.9484889733, -161.4046403503), (201.9484889733, -148.7046403503))
            Line((201.9484889733, -148.7046403503), (201.9484889733, -133.4646403503))
            Line((201.9484889733, -133.4646403503), (201.9484889733, -123.3046403503))
            Line((201.9484889733, -123.3046403503), (181.6284889733, -123.3046403503))
            Line((181.6284889733, -123.3046403503), (163.8484889733, -123.3046403503))
        make_face()
        with BuildLine():
            ThreePointArc((201.9484889733, -148.7046403503), (216.186589213, -141.0846403503), (201.9484889733, -133.4646403503))
            Line((201.9484889733, -133.4646403503), (201.9484889733, -148.7046403503))
        make_face()
    extrude(amount=F16_DEPTH)


solid = Compound([f1.part, f3.part, f5.part, f7.part, f8.part, f10.part, f12.part, f14.part, f16.part])
